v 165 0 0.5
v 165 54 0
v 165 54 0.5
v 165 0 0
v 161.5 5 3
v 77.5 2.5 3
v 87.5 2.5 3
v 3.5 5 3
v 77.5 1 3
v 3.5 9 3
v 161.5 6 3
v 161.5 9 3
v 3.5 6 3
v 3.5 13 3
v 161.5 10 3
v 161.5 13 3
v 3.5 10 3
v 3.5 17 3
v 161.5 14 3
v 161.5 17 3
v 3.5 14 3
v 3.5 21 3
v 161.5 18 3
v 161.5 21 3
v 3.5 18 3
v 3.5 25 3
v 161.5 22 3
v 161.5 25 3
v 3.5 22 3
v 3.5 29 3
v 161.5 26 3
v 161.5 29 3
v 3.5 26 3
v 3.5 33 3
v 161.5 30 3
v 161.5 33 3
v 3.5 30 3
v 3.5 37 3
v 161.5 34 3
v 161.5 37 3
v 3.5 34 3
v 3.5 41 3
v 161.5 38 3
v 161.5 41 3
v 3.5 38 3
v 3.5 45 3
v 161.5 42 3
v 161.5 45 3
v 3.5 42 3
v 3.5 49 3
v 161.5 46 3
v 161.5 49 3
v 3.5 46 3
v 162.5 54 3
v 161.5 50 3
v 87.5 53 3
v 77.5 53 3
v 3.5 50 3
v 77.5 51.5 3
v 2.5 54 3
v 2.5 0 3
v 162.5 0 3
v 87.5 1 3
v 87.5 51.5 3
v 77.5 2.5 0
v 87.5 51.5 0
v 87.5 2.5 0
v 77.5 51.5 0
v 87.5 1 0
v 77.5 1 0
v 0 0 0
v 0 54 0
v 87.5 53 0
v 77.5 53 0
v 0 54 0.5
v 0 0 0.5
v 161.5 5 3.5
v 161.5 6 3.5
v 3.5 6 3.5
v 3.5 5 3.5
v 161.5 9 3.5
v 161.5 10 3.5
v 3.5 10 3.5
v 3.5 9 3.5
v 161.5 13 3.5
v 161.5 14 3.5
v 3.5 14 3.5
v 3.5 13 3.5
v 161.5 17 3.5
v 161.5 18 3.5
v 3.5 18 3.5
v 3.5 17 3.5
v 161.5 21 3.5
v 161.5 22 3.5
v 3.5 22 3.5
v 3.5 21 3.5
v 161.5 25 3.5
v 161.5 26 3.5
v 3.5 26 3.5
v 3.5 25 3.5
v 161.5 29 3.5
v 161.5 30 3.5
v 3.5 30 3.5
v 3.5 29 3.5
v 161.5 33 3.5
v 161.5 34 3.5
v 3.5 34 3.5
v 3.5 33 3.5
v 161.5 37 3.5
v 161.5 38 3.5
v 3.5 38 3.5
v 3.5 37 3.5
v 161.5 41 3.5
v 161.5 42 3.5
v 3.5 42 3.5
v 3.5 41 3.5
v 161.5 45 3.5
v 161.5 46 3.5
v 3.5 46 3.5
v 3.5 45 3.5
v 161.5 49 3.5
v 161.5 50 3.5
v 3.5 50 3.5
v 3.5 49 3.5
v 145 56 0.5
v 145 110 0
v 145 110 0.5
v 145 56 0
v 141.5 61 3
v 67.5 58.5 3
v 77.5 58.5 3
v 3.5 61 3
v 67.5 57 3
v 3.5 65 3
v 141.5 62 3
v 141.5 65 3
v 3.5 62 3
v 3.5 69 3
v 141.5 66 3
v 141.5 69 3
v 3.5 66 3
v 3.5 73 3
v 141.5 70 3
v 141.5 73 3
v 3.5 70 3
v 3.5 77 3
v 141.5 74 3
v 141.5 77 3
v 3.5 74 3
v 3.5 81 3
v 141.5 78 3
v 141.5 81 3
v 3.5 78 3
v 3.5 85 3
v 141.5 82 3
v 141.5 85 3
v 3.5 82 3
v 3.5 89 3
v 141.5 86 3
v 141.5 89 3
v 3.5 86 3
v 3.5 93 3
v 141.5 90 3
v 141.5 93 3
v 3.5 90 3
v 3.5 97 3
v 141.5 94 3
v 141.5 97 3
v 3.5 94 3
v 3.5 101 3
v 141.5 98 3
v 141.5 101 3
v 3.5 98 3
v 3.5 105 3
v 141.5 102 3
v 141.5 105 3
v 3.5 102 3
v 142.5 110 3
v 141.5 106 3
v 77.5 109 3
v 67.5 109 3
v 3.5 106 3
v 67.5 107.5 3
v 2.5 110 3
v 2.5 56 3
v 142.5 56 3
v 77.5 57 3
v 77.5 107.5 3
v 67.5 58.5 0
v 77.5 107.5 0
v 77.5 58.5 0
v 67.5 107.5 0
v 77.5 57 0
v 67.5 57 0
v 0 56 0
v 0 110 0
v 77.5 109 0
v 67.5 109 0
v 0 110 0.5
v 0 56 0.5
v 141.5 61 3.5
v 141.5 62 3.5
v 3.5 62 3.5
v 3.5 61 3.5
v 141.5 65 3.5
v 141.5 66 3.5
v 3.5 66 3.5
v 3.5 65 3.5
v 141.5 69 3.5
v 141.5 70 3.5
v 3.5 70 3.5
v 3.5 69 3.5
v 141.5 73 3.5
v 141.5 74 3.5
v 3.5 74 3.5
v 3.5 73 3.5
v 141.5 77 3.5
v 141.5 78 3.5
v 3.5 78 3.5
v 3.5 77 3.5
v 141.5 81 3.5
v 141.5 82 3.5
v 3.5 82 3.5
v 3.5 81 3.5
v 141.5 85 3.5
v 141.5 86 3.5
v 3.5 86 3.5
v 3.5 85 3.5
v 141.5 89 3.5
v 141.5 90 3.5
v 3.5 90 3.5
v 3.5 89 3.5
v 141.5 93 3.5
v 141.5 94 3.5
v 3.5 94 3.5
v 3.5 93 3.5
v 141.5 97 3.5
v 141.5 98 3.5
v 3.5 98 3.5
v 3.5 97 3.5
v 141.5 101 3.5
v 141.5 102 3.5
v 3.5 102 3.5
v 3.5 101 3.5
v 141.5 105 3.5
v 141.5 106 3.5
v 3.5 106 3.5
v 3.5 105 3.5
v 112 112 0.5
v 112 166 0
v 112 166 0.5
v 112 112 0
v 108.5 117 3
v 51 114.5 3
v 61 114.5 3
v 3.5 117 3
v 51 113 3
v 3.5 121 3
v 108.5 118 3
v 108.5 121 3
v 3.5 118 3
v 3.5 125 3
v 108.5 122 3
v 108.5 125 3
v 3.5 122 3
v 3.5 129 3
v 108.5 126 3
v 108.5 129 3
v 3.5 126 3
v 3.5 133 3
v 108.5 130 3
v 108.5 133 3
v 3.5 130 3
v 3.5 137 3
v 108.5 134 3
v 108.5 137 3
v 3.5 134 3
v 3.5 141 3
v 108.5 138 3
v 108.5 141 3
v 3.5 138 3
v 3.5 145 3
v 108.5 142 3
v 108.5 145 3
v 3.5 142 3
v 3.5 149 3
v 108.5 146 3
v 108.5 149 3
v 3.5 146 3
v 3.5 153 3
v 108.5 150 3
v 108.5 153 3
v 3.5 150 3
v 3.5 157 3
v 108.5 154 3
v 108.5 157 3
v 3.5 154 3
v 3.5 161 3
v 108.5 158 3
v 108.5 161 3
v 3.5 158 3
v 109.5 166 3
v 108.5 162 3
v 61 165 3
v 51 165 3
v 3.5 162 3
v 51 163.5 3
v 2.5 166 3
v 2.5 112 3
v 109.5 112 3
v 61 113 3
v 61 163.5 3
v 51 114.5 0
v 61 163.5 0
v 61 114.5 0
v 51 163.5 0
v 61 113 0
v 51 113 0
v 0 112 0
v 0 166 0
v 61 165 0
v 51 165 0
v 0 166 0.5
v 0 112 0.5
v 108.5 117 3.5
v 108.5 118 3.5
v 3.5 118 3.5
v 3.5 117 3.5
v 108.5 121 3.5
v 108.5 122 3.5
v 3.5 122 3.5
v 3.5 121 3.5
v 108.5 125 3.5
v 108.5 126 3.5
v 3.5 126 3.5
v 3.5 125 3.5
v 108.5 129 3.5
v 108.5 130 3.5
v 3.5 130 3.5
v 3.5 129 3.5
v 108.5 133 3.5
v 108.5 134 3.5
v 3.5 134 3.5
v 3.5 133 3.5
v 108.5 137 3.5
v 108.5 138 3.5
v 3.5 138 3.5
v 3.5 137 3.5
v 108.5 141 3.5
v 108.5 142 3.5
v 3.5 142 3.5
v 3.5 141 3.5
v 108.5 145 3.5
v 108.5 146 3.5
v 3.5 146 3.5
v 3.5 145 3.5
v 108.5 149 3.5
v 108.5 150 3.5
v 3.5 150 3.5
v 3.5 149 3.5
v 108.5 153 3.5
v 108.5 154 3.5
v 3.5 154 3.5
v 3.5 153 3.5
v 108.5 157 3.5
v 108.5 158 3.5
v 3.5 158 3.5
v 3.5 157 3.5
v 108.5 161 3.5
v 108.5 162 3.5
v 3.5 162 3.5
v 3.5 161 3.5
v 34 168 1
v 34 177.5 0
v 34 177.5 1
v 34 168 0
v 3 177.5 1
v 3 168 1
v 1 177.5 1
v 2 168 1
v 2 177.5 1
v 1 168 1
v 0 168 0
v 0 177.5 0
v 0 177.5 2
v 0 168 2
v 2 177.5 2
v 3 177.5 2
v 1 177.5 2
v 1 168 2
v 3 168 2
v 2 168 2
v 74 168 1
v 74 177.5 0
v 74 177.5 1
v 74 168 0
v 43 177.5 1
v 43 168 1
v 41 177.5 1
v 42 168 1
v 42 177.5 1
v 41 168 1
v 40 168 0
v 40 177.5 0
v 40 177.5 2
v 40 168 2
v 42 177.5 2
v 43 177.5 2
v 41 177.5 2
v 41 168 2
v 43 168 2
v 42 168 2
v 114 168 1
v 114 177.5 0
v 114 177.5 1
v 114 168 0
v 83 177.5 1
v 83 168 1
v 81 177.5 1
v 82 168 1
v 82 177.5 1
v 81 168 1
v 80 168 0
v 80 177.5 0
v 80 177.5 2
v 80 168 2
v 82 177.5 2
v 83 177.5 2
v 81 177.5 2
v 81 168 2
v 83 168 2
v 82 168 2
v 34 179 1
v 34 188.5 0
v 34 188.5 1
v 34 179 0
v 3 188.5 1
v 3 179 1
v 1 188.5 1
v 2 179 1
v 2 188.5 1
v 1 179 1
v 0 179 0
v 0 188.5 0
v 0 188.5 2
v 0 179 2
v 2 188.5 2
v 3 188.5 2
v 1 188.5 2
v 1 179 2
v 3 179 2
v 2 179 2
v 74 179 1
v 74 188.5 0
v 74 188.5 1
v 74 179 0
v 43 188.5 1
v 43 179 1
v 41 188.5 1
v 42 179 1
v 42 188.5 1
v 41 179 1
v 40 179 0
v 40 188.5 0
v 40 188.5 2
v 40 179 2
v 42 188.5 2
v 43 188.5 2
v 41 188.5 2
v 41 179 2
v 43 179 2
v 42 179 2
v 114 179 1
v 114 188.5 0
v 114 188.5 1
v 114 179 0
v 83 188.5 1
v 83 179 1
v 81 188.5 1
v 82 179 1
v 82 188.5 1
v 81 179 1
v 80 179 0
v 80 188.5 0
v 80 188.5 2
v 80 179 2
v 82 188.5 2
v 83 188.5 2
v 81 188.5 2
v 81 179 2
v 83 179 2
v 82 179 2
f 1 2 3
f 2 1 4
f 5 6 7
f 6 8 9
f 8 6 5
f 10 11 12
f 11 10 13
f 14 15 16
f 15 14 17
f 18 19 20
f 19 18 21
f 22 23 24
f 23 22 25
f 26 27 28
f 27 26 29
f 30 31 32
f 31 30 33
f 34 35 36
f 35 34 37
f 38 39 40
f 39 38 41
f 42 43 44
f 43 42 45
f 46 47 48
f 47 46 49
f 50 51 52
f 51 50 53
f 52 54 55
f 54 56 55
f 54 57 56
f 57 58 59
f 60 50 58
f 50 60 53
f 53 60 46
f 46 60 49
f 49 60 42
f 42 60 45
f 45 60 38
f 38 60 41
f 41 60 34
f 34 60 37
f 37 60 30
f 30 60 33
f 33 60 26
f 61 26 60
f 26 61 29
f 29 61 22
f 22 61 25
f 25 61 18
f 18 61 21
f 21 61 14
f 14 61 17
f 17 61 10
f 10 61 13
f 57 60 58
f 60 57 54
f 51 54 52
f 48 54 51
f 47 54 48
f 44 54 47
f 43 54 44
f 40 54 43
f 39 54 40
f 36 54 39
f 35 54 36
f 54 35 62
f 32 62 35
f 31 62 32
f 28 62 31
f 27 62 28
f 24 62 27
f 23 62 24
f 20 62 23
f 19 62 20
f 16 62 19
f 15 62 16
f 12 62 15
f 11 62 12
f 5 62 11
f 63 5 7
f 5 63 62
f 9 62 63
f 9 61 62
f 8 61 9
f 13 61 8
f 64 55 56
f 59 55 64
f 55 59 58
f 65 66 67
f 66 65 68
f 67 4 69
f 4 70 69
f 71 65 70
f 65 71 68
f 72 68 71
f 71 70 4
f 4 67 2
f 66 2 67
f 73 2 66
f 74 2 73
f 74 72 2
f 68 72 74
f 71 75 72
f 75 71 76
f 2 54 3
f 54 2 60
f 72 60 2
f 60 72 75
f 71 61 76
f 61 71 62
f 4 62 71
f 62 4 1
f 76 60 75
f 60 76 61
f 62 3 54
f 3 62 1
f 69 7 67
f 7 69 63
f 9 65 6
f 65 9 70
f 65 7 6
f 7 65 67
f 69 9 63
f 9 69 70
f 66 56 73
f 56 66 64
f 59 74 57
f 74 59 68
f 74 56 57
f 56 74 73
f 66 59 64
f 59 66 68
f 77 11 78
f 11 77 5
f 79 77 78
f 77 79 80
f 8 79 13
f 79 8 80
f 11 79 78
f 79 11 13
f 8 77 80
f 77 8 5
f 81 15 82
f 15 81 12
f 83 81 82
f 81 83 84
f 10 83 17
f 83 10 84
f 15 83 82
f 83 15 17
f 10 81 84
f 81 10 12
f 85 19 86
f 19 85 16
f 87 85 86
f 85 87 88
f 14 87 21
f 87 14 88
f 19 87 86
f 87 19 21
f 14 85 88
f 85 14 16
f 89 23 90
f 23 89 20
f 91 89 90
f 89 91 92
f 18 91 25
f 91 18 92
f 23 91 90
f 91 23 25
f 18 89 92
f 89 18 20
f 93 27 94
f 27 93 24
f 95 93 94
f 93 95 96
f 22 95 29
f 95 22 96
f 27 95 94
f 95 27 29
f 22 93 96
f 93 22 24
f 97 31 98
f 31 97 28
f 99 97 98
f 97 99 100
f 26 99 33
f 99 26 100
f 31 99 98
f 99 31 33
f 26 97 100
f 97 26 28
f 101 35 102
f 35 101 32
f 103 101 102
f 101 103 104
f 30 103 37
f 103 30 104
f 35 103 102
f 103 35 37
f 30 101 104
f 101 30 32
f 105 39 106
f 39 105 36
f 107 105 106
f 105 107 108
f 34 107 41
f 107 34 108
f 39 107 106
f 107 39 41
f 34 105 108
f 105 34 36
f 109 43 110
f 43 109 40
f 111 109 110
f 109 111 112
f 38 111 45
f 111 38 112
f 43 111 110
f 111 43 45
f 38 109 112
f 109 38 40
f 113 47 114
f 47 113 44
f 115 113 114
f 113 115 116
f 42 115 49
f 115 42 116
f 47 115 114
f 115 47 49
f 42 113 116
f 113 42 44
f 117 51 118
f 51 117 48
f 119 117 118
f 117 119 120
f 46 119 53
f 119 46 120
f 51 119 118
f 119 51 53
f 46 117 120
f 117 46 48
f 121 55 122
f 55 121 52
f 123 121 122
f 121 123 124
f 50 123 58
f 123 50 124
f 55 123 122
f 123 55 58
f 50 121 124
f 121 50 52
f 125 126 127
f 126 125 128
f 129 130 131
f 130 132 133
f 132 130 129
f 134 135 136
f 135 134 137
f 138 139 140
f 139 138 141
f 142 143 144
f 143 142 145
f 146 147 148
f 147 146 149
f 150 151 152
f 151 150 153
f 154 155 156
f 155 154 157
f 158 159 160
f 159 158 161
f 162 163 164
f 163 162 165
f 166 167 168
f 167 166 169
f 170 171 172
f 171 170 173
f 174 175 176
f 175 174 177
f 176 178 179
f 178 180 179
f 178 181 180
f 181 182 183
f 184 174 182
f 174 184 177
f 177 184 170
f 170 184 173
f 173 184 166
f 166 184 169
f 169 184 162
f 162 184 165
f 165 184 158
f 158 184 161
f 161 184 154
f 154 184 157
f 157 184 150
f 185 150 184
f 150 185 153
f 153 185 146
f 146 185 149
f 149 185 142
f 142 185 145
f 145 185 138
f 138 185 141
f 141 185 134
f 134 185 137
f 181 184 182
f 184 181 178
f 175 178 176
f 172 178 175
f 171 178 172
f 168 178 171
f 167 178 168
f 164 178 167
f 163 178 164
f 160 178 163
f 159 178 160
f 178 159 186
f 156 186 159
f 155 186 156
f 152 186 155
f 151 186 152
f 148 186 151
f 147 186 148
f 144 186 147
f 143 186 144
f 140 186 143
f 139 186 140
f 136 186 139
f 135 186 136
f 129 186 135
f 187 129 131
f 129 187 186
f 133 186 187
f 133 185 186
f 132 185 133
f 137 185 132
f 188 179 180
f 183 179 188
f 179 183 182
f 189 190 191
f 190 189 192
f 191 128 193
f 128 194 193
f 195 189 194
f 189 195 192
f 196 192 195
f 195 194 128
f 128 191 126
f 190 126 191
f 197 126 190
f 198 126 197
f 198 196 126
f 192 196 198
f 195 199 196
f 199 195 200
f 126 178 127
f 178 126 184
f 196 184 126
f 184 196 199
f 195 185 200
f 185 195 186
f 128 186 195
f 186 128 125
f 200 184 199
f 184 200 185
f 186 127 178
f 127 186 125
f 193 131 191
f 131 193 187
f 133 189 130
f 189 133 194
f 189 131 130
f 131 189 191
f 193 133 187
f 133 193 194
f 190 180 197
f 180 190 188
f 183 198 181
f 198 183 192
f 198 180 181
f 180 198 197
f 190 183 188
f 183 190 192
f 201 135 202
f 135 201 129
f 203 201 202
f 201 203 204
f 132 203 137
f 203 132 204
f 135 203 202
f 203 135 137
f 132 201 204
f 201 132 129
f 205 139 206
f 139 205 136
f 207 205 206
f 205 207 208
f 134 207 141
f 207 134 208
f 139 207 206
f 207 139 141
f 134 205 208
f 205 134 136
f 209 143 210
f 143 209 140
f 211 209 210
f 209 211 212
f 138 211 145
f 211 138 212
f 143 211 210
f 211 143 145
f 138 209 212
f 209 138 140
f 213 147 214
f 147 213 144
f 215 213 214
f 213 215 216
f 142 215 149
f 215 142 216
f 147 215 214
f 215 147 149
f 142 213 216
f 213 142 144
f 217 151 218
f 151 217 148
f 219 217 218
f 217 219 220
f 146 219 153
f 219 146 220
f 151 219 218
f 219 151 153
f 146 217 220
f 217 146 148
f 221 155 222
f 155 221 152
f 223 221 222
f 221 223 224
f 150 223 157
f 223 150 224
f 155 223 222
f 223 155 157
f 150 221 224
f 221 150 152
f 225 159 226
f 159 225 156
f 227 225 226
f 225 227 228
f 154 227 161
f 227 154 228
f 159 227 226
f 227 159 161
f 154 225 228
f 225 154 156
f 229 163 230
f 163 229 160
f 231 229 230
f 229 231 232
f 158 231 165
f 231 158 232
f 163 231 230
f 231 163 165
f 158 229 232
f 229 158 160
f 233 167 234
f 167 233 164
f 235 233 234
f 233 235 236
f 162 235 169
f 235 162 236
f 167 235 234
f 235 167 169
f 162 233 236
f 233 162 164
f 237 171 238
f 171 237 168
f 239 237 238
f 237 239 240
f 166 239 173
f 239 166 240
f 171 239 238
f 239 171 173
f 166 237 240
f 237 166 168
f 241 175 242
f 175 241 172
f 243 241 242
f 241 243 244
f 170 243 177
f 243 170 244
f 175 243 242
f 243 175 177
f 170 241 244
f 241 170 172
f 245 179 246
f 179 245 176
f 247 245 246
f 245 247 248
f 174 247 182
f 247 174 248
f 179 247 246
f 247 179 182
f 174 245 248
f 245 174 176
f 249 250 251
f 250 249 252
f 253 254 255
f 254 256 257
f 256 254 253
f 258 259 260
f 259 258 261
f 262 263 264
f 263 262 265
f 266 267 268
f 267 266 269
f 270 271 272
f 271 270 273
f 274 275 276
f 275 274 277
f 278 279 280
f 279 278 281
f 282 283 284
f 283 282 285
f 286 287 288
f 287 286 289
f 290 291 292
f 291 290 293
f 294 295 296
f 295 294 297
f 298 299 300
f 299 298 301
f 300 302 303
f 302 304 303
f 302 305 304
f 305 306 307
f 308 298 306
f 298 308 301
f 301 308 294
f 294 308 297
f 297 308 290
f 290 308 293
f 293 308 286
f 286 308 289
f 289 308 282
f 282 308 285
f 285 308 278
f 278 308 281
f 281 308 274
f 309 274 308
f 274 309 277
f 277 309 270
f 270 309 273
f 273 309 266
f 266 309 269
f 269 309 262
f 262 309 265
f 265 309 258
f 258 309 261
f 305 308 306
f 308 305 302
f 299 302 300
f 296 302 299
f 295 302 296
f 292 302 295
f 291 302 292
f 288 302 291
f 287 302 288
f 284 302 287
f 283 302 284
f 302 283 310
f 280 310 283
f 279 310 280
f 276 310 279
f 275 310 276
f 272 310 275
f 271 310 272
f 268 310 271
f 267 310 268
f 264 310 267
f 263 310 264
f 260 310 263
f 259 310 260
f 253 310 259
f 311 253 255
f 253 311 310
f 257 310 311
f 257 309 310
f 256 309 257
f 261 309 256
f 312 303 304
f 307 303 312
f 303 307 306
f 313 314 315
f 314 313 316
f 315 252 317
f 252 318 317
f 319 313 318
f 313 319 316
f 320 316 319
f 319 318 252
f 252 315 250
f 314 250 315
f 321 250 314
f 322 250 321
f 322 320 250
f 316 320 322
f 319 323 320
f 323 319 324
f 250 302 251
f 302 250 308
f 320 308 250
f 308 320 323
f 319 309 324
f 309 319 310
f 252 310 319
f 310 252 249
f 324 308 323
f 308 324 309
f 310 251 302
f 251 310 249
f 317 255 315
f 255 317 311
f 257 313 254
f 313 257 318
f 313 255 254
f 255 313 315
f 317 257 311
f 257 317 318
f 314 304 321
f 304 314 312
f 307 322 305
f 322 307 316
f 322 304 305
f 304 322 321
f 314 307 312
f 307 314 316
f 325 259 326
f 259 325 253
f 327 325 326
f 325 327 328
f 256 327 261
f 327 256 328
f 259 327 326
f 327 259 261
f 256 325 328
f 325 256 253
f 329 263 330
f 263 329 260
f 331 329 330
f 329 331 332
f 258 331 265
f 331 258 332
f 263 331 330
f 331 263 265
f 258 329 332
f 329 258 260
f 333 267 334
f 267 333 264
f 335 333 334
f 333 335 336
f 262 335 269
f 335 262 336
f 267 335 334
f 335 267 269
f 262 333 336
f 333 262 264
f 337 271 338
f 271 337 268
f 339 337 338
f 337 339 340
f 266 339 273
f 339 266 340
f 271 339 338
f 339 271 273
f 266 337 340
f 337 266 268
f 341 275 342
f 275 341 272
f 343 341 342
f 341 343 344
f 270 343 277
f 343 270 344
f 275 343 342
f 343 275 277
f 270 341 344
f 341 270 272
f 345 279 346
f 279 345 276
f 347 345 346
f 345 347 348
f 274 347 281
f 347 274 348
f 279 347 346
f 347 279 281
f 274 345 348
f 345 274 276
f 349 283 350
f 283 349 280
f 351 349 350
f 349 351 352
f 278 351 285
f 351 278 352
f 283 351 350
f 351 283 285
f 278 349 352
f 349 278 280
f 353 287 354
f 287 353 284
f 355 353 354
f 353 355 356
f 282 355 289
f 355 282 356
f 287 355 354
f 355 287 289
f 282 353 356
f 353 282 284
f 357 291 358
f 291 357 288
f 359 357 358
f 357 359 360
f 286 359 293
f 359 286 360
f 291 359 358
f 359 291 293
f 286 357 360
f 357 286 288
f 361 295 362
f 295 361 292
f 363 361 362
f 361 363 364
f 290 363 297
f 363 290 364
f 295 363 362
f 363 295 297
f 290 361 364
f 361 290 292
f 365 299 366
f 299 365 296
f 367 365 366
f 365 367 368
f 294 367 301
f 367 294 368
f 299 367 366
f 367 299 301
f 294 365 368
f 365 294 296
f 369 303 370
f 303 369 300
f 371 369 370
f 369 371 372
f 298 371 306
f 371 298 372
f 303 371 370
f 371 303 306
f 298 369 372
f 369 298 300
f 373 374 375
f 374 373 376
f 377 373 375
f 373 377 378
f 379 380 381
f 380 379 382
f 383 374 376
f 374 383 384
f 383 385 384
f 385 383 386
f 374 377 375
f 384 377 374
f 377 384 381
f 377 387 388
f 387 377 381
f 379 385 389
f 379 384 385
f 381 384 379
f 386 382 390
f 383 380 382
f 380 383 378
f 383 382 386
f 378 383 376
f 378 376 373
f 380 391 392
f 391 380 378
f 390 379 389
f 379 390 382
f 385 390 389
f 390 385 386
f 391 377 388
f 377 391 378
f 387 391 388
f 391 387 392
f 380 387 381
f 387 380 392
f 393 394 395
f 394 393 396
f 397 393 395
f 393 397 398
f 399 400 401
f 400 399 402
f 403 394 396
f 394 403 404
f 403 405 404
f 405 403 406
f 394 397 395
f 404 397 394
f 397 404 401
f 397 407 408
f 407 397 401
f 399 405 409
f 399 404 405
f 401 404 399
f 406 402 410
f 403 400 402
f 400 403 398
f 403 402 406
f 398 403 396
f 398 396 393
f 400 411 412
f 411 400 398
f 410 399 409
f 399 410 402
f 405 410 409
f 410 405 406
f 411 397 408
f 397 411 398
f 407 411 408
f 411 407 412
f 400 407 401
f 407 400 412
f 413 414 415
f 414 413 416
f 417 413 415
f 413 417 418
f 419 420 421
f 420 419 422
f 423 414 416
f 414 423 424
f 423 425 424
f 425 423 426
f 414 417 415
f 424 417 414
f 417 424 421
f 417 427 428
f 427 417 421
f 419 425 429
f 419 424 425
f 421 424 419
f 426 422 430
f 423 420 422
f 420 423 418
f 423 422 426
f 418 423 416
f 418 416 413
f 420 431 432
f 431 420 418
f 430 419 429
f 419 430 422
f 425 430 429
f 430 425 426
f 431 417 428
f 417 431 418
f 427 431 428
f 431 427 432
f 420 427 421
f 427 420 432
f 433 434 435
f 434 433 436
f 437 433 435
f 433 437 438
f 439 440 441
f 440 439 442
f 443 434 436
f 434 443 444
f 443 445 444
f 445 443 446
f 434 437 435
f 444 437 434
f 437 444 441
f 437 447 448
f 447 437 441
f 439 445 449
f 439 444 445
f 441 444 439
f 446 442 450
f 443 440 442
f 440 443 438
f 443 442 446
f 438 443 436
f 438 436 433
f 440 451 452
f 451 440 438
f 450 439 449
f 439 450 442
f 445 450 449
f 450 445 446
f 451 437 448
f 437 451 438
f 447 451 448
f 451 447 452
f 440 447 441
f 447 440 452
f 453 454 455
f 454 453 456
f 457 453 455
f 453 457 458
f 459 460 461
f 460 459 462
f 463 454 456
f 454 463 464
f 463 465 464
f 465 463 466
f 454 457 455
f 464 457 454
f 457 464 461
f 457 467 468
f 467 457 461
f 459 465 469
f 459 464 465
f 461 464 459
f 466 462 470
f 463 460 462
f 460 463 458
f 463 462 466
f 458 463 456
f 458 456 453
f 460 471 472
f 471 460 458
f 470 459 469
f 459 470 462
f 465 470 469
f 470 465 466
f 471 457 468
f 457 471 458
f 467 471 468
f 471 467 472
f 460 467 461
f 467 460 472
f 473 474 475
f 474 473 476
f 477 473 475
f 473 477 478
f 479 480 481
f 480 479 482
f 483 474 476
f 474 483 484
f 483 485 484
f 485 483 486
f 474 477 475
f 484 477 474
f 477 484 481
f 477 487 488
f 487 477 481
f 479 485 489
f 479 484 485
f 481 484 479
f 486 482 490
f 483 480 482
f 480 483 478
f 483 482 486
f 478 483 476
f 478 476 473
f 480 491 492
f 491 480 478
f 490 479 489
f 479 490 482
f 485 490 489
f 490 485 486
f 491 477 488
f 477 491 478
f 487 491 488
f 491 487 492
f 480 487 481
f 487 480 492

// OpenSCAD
/*
Open Mating Nuc, released to the Public Domain by Robert Niles
*/

lid(l=180);
translate([0,56,0]) lid(l=160);
translate([0,112,0]) lid(l=127);

// print two wedges for each section
translate([0,168,0]) glass_wedge();
translate([40,168,0]) glass_wedge();
translate([80,168,0]) glass_wedge();
translate([0,179,0]) glass_wedge();
translate([40,179,0]) glass_wedge();
translate([80,179,0]) glass_wedge();


module glass_wedge() {
    color("blue") translate([0,0,0]) cube([34,9.5,1]);
    color("red") translate([0,0,1]) cube([1,9.5,1]);
    color("red") translate([2,0,1]) cube([1,9.5,1]);
}

module lid(l=100,w=54,h=3,wt=2,t=2,et=0.5,r=5){
    l = l-15.0; // was 15.50
	translate ([0, 0, 0]) 
	rotate (a = [0, 0, 0]) 
	difference(){
		cube([l,w,h]);
		translate ([0, -1, et]) rotate (a = [45, 0, 90]) cube (size = [w+2, h*2, h*2]); 
        
        translate ([l, -1, et]) rotate (a = [45, 0, 90]) cube (size = [w+2, h*2, h*2]);
        
        //slits for the glass wedges
        color("blue") translate([(l/2)-5,1,0]) cube([10,1.5,3]);
        color("blue") translate([(l/2)-5,54-2.5,0]) cube([10,1.5,3]);
	}    
     grip_ribs(l-7,w);
}

module grip_ribs(l,w=54) {
    n = floor(w/10);
    for (i=[n:4:w-4]) {
        color("blue") translate([3.5,i,3]) cube([l,1,.5]);
    }
}
